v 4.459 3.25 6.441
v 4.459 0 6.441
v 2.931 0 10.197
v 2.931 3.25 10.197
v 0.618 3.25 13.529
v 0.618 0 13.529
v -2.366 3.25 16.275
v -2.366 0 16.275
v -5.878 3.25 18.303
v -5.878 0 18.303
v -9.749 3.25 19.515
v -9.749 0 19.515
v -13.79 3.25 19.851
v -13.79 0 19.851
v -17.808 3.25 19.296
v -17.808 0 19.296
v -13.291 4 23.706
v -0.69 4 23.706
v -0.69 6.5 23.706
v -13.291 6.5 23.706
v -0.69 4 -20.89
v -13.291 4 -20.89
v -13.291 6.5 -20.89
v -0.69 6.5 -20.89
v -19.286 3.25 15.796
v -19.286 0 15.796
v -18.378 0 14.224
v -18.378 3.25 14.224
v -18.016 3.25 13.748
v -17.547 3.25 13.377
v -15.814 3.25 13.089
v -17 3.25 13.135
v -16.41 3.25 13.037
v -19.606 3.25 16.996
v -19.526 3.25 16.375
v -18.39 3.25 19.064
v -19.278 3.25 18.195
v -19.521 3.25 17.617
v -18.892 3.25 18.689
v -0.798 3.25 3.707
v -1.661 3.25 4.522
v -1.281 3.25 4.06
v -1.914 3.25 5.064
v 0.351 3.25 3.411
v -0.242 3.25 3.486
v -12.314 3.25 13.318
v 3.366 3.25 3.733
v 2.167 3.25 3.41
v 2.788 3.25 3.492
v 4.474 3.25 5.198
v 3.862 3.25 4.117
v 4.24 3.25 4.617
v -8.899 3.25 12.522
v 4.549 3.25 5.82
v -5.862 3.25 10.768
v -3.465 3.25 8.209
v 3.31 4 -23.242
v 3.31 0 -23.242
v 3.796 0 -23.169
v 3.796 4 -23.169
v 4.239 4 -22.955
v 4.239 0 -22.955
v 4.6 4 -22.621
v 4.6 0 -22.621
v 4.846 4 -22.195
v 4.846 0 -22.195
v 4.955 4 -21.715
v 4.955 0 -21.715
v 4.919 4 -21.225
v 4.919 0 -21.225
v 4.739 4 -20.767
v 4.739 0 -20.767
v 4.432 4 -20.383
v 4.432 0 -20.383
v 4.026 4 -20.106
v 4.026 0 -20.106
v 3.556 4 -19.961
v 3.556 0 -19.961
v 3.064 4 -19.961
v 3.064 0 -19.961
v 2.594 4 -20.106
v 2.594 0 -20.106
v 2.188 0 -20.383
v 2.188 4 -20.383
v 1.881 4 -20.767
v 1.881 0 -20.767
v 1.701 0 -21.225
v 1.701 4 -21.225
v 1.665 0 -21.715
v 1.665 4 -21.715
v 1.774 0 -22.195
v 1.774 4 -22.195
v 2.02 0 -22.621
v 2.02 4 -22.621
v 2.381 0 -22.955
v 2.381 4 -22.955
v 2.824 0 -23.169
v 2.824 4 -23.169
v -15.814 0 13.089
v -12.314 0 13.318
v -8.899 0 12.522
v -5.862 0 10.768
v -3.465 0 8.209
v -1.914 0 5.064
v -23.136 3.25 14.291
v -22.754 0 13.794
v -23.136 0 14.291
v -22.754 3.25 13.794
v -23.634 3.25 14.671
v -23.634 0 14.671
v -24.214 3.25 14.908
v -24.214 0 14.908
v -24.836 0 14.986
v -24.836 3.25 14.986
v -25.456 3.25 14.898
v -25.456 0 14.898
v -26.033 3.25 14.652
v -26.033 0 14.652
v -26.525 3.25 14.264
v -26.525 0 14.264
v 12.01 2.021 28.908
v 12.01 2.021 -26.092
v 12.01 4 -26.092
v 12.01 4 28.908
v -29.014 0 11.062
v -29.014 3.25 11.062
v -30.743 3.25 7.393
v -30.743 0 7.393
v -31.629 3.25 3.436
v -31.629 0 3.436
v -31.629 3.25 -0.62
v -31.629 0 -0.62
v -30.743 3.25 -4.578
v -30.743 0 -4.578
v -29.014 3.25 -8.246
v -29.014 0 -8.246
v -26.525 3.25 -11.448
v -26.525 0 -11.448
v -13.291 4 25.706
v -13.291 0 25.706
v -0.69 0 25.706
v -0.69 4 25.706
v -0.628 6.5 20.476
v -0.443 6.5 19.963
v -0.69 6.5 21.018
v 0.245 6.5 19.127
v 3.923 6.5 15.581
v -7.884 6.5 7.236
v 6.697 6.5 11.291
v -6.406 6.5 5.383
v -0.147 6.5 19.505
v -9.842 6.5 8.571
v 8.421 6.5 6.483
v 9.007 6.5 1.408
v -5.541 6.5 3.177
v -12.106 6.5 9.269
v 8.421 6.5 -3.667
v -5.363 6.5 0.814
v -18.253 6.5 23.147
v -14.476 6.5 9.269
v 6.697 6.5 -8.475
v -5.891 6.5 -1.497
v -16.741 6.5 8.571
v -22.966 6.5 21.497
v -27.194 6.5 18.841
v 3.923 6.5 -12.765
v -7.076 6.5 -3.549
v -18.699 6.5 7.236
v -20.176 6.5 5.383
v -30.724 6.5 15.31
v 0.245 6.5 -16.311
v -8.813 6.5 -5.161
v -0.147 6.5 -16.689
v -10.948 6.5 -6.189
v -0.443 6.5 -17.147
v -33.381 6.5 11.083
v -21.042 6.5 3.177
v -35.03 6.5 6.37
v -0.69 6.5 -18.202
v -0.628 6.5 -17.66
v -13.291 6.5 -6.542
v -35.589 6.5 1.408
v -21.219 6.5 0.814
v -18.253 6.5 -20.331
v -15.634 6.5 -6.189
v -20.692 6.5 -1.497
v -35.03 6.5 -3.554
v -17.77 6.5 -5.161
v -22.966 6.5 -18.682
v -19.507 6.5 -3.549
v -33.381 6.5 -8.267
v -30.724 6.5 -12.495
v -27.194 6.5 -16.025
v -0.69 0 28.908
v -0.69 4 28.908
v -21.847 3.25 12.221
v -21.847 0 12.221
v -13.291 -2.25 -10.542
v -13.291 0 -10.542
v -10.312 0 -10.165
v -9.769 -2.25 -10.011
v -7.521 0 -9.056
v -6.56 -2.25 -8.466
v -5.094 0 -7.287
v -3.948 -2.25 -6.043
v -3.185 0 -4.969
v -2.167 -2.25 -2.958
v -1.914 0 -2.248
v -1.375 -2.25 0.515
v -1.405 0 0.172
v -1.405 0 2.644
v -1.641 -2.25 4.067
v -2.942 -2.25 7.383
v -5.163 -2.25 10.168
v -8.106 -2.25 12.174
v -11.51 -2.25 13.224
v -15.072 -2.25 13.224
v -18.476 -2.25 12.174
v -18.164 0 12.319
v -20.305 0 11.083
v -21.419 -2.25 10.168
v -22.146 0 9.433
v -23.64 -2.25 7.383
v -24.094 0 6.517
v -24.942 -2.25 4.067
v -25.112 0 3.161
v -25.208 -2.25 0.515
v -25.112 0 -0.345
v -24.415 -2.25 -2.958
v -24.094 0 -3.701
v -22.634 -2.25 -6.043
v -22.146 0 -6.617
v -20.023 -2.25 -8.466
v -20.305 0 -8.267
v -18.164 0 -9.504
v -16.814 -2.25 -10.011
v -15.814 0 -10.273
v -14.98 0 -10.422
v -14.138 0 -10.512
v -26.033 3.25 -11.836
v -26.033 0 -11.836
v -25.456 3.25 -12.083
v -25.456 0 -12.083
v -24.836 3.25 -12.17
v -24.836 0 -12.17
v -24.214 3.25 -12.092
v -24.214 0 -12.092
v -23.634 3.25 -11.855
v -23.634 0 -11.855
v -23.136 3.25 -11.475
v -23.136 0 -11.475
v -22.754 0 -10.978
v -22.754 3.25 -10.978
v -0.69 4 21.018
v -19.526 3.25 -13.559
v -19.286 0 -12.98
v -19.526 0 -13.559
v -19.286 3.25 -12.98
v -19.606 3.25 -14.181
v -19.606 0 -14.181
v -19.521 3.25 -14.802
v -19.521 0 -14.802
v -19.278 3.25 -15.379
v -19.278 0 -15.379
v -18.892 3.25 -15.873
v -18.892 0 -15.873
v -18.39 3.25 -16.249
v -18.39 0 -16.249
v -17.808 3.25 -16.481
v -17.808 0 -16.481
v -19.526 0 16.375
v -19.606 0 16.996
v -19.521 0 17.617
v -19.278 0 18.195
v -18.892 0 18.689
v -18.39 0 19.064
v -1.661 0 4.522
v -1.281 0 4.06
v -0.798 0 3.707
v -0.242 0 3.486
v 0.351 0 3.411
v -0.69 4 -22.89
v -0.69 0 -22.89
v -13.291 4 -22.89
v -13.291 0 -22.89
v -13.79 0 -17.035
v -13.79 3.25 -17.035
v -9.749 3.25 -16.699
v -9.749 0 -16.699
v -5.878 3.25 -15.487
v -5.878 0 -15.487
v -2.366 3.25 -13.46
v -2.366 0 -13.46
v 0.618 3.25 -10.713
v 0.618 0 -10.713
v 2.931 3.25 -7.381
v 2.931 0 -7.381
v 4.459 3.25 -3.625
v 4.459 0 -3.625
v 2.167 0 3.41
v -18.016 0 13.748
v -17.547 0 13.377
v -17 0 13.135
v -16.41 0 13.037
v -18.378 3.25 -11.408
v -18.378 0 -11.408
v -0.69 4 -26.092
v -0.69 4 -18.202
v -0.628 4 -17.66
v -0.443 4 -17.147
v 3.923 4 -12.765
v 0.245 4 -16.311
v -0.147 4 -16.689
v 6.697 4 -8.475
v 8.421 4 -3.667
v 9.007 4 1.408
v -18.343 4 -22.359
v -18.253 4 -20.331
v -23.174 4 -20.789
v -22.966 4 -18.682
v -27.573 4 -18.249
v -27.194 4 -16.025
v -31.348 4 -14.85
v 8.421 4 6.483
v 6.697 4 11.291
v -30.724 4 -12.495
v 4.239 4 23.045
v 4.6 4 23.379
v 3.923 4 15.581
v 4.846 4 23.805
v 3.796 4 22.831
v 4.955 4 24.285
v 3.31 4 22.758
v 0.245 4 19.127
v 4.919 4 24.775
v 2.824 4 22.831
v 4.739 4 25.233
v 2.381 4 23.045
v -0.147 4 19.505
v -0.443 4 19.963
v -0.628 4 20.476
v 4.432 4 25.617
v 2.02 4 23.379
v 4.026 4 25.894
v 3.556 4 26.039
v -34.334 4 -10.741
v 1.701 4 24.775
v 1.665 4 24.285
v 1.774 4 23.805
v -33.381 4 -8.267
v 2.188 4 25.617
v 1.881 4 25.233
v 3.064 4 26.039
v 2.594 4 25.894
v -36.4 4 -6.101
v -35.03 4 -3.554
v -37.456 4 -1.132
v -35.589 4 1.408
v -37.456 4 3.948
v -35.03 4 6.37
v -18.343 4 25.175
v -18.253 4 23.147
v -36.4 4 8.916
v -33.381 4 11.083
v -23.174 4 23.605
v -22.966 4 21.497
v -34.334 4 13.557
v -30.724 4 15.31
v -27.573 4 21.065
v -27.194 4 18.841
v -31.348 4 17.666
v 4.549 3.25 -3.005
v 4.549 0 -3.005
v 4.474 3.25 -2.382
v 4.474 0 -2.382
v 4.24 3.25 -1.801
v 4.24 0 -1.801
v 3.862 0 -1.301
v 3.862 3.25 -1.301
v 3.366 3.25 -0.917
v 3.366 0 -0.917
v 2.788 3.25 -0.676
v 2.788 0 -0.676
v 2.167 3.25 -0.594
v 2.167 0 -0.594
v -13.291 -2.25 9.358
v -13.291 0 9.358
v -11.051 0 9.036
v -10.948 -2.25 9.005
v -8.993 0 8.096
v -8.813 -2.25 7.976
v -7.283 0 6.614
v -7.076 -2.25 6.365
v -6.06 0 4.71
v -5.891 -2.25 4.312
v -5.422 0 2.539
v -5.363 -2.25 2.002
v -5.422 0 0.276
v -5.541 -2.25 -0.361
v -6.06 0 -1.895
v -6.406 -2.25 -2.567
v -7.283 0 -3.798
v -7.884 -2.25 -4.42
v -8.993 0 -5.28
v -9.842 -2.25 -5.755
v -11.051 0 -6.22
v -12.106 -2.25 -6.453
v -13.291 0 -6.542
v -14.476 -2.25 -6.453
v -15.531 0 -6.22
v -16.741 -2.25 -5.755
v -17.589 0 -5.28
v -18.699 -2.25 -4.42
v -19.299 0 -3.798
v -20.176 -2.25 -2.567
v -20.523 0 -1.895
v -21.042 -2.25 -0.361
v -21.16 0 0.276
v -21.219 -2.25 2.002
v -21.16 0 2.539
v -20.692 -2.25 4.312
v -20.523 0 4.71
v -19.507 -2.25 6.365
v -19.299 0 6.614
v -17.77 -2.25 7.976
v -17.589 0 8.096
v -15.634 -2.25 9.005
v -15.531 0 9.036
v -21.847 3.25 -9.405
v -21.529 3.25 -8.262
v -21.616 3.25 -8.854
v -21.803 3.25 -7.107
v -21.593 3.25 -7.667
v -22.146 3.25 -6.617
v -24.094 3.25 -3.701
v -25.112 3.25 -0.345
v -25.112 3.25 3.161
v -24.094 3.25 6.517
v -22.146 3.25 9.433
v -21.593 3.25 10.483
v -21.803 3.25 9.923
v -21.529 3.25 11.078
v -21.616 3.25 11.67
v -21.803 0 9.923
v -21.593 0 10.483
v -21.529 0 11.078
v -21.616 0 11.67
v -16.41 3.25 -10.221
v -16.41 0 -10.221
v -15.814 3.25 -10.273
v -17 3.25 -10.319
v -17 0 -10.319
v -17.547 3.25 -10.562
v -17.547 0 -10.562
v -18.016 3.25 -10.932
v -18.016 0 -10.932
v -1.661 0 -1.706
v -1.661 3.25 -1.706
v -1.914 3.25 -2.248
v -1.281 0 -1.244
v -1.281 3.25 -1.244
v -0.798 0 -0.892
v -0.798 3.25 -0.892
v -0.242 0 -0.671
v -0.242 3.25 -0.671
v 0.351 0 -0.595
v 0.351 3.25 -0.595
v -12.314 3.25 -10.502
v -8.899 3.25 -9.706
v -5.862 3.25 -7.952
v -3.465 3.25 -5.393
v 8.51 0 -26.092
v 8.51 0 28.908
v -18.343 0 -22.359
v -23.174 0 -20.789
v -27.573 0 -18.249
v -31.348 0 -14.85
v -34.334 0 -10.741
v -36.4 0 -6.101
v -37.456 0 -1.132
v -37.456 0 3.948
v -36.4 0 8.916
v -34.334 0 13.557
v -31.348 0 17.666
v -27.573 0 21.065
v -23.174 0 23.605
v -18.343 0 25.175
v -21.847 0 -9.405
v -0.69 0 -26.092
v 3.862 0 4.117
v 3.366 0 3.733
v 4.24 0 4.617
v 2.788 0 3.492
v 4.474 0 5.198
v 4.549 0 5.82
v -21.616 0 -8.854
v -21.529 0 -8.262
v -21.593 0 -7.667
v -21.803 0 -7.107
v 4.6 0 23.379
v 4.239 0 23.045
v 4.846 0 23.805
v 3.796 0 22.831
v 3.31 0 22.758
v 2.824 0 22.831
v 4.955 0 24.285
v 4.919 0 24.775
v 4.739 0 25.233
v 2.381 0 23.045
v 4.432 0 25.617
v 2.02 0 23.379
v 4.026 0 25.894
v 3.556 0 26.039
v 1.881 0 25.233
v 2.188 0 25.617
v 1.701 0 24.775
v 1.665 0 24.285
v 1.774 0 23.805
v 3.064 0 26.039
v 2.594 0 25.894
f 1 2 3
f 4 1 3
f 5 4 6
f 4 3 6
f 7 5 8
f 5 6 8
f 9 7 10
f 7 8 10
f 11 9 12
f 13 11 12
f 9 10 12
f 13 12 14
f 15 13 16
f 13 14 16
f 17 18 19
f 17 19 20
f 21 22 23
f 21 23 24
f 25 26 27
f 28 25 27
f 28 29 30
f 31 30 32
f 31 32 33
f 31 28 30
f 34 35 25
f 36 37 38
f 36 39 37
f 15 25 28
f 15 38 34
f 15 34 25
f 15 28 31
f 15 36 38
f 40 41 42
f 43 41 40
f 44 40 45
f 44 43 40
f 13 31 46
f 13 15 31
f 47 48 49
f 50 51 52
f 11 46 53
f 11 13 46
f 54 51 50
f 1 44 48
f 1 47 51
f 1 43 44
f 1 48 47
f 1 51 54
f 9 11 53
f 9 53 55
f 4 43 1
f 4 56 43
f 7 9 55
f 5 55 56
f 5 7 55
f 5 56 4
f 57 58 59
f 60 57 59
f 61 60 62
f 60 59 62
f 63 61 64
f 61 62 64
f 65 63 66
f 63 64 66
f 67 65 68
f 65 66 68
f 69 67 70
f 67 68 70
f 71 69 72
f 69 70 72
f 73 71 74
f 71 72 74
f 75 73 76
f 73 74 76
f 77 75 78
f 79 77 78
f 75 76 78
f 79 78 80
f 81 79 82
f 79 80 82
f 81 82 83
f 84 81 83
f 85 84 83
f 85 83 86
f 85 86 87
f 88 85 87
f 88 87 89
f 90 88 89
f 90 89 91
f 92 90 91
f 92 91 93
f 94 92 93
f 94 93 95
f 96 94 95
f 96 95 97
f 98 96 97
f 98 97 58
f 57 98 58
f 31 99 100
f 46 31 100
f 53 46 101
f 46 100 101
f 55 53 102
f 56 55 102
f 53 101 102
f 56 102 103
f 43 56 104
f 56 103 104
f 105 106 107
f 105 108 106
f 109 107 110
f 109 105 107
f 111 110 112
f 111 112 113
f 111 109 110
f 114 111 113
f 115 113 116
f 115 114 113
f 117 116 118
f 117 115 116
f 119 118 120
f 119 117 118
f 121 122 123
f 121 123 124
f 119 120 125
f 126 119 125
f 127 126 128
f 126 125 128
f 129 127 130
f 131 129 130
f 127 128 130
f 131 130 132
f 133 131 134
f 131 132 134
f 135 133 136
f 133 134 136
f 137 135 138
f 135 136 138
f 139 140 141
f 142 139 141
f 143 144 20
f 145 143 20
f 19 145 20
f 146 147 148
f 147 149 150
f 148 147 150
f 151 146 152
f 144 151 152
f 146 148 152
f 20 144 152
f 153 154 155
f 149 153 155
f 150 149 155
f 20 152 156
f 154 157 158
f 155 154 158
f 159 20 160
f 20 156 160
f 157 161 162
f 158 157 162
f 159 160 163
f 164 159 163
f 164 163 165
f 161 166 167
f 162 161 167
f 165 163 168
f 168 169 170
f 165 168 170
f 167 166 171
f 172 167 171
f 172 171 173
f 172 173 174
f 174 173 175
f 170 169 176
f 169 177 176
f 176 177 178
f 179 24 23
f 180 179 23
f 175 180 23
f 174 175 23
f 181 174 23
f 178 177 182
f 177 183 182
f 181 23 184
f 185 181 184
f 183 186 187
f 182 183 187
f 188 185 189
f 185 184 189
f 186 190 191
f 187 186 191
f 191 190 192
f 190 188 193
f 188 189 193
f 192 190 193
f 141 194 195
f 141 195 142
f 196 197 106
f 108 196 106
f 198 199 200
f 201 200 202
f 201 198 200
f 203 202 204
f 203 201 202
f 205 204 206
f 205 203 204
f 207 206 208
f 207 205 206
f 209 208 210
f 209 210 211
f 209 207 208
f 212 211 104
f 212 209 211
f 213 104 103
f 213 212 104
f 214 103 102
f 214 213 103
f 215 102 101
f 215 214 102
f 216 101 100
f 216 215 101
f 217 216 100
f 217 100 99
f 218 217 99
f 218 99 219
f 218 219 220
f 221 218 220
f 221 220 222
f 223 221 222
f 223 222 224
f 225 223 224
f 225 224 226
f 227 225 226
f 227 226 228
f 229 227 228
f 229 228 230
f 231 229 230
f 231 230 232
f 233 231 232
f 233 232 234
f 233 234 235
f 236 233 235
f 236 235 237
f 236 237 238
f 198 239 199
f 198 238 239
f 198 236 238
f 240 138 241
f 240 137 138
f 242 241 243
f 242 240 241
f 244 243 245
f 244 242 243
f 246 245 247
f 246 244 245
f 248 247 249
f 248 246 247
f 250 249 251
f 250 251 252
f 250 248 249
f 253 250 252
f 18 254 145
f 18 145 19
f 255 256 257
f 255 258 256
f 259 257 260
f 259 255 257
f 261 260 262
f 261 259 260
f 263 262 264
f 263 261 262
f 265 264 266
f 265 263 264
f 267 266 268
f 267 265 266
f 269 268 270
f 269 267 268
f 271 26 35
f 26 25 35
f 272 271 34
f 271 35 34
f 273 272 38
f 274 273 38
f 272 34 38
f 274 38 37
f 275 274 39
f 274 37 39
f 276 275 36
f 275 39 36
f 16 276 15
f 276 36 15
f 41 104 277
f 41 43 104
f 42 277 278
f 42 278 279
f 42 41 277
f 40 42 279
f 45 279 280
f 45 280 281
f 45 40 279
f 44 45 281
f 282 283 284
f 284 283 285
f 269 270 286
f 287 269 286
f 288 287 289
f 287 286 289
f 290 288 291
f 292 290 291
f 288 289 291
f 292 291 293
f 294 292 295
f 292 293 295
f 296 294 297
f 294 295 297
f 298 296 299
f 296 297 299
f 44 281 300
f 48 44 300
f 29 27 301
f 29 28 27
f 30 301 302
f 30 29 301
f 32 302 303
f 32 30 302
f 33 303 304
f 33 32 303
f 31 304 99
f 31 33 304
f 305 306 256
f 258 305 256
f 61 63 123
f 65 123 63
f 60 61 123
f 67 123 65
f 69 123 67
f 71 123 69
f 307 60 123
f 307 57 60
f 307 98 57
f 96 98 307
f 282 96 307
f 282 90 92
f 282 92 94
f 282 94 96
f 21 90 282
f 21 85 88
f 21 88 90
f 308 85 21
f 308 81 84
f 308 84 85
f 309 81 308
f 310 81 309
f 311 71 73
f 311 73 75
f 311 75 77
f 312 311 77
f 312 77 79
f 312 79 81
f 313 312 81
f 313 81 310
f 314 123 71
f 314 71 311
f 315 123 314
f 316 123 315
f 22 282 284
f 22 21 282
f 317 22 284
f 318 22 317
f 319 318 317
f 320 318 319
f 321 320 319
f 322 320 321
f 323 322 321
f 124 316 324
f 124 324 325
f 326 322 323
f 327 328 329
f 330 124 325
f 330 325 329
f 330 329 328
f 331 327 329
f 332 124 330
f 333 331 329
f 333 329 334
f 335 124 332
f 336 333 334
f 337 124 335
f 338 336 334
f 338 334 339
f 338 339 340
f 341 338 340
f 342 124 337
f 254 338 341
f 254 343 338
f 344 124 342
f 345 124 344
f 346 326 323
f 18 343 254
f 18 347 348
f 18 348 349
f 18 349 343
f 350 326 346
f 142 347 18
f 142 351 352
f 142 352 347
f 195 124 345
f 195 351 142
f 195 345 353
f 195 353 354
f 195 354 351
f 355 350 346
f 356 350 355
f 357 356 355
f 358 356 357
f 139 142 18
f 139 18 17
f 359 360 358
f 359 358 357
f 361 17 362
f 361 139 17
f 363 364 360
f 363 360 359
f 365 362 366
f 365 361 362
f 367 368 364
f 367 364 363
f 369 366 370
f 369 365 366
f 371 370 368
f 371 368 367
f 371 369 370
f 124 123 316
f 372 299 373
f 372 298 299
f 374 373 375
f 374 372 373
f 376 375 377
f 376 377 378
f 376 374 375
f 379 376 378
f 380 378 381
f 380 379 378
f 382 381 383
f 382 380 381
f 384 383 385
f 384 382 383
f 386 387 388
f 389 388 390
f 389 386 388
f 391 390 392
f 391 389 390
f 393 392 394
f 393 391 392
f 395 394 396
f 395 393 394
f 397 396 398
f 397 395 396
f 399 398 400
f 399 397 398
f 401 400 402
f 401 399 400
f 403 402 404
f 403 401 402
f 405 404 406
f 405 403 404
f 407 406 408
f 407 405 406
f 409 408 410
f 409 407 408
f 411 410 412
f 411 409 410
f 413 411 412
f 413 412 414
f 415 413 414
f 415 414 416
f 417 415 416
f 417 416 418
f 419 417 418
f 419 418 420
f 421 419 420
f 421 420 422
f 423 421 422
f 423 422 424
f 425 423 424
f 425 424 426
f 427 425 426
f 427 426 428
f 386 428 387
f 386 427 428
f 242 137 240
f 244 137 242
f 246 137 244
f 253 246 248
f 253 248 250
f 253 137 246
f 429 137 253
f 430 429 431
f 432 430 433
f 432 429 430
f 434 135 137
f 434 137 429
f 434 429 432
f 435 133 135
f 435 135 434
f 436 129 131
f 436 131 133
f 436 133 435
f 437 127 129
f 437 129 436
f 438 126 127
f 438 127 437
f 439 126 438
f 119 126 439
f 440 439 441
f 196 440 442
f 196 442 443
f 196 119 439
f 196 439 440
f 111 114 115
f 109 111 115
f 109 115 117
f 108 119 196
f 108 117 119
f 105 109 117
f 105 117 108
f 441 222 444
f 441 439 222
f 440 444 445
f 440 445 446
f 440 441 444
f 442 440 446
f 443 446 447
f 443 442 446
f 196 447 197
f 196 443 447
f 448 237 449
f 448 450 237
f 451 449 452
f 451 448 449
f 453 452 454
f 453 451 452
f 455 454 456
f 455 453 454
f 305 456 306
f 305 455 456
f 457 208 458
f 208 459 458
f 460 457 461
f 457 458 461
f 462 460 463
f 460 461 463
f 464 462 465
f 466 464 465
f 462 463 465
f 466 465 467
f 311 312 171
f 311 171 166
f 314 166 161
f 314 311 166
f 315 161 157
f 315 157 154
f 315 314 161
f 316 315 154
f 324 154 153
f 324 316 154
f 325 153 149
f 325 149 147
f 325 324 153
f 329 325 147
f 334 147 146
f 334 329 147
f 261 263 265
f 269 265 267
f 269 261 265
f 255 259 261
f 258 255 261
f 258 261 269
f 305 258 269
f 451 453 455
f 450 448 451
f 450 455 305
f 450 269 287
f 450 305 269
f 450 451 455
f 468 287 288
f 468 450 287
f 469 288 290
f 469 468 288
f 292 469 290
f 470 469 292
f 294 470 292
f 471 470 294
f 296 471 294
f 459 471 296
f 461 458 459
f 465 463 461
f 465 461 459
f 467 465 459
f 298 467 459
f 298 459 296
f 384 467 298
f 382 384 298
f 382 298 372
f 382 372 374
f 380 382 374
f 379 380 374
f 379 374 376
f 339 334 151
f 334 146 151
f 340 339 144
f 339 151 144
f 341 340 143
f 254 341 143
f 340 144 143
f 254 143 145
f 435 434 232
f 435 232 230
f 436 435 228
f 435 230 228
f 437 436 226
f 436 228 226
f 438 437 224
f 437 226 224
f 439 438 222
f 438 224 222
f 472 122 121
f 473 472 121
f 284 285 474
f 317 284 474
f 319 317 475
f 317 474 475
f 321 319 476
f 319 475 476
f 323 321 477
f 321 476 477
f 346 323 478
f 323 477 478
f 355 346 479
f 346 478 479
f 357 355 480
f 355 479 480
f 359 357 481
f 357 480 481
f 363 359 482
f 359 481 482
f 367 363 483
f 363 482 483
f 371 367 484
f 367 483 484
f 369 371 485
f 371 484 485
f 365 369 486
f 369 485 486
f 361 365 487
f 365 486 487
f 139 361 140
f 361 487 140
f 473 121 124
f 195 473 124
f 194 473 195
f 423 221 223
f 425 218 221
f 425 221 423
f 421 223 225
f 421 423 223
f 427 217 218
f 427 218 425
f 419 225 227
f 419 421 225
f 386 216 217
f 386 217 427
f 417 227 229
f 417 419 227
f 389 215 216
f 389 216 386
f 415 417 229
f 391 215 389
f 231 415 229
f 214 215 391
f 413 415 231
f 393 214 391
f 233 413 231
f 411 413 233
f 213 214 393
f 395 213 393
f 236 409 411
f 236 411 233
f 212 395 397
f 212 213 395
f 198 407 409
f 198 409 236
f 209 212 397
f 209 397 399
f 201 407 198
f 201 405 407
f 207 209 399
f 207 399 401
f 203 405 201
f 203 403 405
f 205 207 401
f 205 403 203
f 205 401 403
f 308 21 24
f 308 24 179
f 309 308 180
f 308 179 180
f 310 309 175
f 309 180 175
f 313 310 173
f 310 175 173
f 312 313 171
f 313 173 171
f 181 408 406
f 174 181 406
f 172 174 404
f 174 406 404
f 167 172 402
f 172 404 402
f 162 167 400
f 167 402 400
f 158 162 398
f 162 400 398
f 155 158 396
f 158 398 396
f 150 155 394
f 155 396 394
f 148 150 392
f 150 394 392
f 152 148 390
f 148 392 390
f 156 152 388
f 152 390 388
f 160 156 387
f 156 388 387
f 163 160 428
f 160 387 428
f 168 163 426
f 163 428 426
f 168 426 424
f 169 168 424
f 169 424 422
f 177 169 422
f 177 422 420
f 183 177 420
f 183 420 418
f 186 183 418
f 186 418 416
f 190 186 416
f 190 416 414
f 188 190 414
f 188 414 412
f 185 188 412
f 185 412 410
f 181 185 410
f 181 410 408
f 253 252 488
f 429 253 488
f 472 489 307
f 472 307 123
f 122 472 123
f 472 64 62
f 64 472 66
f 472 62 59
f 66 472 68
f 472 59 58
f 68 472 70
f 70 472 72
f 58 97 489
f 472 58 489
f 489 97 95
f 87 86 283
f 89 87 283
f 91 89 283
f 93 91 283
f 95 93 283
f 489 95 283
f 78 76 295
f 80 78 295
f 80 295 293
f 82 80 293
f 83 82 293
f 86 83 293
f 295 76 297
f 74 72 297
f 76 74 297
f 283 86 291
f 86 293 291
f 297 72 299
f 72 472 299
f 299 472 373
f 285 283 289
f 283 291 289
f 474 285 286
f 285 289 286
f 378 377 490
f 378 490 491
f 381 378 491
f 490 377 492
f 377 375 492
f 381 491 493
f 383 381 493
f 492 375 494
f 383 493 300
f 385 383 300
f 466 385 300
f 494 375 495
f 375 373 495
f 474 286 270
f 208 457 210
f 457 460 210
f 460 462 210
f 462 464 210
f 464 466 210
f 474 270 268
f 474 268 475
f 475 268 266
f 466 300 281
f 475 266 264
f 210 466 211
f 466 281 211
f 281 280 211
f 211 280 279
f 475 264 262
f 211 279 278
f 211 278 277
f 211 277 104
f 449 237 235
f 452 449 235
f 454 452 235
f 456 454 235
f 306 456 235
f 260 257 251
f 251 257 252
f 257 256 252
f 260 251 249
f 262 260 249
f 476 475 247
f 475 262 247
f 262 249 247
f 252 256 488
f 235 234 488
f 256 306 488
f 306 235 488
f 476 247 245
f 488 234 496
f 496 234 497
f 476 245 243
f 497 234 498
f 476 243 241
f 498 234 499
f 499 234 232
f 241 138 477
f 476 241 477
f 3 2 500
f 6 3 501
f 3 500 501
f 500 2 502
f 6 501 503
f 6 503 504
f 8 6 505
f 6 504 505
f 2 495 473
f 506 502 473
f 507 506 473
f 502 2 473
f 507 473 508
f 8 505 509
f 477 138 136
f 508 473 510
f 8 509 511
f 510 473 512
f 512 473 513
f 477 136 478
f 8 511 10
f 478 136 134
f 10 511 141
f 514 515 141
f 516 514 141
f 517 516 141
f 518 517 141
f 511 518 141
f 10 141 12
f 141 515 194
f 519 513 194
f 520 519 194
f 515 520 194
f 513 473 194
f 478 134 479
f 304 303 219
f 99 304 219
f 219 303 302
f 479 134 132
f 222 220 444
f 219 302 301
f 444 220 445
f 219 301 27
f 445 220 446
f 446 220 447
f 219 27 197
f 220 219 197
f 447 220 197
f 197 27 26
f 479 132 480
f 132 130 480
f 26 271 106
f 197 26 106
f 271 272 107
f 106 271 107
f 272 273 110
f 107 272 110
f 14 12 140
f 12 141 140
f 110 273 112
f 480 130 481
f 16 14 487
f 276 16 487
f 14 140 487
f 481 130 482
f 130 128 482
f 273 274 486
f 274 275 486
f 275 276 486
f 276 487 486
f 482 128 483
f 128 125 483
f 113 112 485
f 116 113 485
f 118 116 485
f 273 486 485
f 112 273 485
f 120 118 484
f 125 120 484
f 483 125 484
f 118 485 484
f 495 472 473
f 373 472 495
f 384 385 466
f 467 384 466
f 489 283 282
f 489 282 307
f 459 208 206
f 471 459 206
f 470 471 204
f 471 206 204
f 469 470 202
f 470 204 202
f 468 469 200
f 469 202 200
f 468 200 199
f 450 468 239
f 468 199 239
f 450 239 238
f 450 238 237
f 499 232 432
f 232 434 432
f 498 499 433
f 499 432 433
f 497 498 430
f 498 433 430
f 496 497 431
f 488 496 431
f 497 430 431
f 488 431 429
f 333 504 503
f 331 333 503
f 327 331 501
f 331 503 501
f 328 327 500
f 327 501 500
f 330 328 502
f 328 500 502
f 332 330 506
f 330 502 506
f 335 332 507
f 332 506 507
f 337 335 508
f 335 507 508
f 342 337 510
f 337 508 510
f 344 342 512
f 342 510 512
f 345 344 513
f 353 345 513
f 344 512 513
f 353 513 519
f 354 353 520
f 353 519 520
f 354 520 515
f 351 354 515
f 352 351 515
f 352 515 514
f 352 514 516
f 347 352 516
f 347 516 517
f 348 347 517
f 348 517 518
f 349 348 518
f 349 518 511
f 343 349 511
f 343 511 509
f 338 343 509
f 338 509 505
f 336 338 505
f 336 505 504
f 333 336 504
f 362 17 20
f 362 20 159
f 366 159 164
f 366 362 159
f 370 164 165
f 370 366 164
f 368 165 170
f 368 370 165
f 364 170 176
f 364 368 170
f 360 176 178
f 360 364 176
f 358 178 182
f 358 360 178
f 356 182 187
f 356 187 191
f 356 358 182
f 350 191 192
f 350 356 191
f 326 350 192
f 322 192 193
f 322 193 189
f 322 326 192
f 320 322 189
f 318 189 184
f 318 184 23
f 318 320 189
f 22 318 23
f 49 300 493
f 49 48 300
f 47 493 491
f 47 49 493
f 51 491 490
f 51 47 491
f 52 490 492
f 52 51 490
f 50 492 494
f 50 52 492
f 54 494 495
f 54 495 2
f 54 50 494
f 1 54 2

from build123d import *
from build123d.topology import SkipClean

# Parameters (mm, degrees)
BOSS_EXTRUDE1_DEPTH = 4
BOSS_EXTRUDE2_DEPTH = 2.5
SKETCH3_R           = 7.95
CUT_EXTRUDE1_DEPTH  = 9.25
SKETCH4_R           = 1.65
CUT_EXTRUDE2_DEPTH  = 9.25
CUT_EXTRUDE3_DEPTH  = 3.25
FILLET1_R           = 2.38125
CHAMFER1_SIZE       = 3.5
CHAMFER1_SIZE2      = 2.020725942
BOSS_EXTRUDE4_DEPTH = 4
BOSS_EXTRUDE5_START = 2.25
SKETCH11_R          = 11.95
BOSS_EXTRUDE5_DEPTH = 2.25
CUT_EXTRUDE4_START  = -2.25
SKETCH12_R          = 7.95
CUT_EXTRUDE4_DEPTH  = 2.25
FILLET5_R           = 2.38


with BuildPart() as part:
    # Sketch1 → Boss-Extrude1 (new body)
    with BuildSketch(Plane(origin=(0, 0, 0), x_dir=(1, 0, 0), z_dir=(0, 1, 0))):
        with BuildLine():
            Line((-13.29118379, 20.889836125), (-0.68999579, 20.889836125))
            Line((-0.68999579, 20.889836125), (-0.68999579, 26.09210312))
            Line((-0.68999579, 26.09210312), (12.01000421, 26.09210312))
            Line((12.01000421, 26.09210312), (12.01000421, -28.90789688))
            Line((12.01000421, -28.90789688), (-0.68999579, -28.90789688))
            Line((-0.68999579, -28.90789688), (-0.68999579, -23.705629885))
            Line((-0.68999579, -23.705629885), (-13.29118379, -23.705629885))
            ThreePointArc((-13.29118379, -23.705629885), (-35.588916795, -1.40789688), (-13.29118379, 20.889836125))
        make_face()
    extrude(amount=BOSS_EXTRUDE1_DEPTH)

    # Sketch2 → Boss-Extrude2 (add)
    with BuildSketch(Plane(origin=(0, 4, 0), x_dir=(1, 0, 0), z_dir=(0, 1, 0))):
        with BuildLine():
            Line((-13.29118379, 20.889836125), (-0.68999579, 20.889836125))
            Line((-0.68999579, 20.889836125), (-0.68999579, 16.987726462))
            ThreePointArc((-0.68999579, 16.987726462), (9.006549215, -1.40789688), (-0.68999579, -19.803520222))
            Line((-0.68999579, -19.803520222), (-0.68999579, -23.705629885))
            Line((-0.68999579, -23.705629885), (-13.29118379, -23.705629885))
            ThreePointArc((-13.29118379, -23.705629885), (-35.588916795, -1.40789688), (-13.29118379, 20.889836125))
        make_face()
    extrude(amount=BOSS_EXTRUDE2_DEPTH)

    # Sketch3 → Cut-Extrude1 (cut)
    with BuildSketch(Plane.XZ):
        with Locations(Location((-13.29118379, 1.40789688, 0), (0, 0, 270))):
            Circle(SKETCH3_R)
    extrude(amount=-CUT_EXTRUDE1_DEPTH, mode=Mode.SUBTRACT)

    # Sketch4 → Cut-Extrude2 (cut)
    with BuildSketch(Plane.XZ):
        with Locations(Location((3.31000421, 24.40789688, 0), (0, 0, 270))):
            Circle(SKETCH4_R)
        with Locations(Location((3.310004206, -21.59210312, 0), (0, 0, 270))):
            Circle(SKETCH4_R)
    extrude(amount=-CUT_EXTRUDE2_DEPTH, mode=Mode.SUBTRACT)

    # Sketch5 → Cut-Extrude3 (cut)
    with BuildSketch(Plane.XZ):
        with BuildLine():
            ThreePointArc((-20.917233099, -7.792422241), (-25.24118379, 1.40789688), (-20.917233099, 10.608216001))
            Line((-20.917233099, 10.608216001), (-24.193916765, 16.291878661))
            ThreePointArc((-24.193916765, 16.291878661), (-31.74118379, 1.40789688), (-24.193916765, -13.476084902))
            Line((-24.193916765, -13.476084902), (-20.917233099, -7.792422241))
        make_face()
        with BuildLine():
            Line((-20.729723635, 18.291931497), (-17.445869217, 12.612408873))
            ThreePointArc((-17.445869217, 12.612408873), (-7.31618379, 11.756900455), (-1.510449053, 3.412089752))
            Line((-1.510449053, 3.412089752), (5.05008903, 3.407949716))
            ThreePointArc((5.05008903, 3.407949716), (-4.06618379, 17.38606558), (-20.729723635, 18.291931497))
        make_face()
        with BuildLine():
            ThreePointArc((-1.510449053, -0.596295992), (-7.31618379, -8.941106696), (-17.445869217, -9.796615113))
            Line((-17.445869217, -9.796615113), (-20.729723635, -15.476137738))
            ThreePointArc((-20.729723635, -15.476137738), (-4.06618379, -14.57027182), (5.05008903, -0.592155956))
            Line((5.05008903, -0.592155956), (-1.510449053, -0.596295992))
        make_face()
    extrude(amount=-CUT_EXTRUDE3_DEPTH, mode=Mode.SUBTRACT)

    # Fillet1
    fillet1_edges = [part.edges().sort_by_distance(p)[0] for p in [
        (-20.917233099, 1.625, 10.608216001),
        (-20.917233099, 1.625, -7.792422241),
        (-24.193916765, 1.625, -13.476084902),
        (-24.193916765, 1.625, 16.291878661),
        (5.05008903, 1.625, 3.407949716),
        (-1.510449053, 1.625, 3.412089752),
        (-17.445869217, 1.625, 12.612408873),
        (-20.729723635, 1.625, 18.291931497),
        (-17.445869217, 1.625, -9.796615113),
        (-1.510449053, 1.625, -0.596295992),
        (5.05008903, 1.625, -0.592155956),
        (-20.729723635, 1.625, -15.476137738),
    ]]
    fillet(fillet1_edges, radius=FILLET1_R)

    # Chamfer1
    chamfer1_edges = [part.edges().sort_by_distance(p)[0] for p in [
        (12.01000421, 0, 1.40789688),
    ]]
    chamfer1_side = [part.faces().sort_by_distance(p)[0] for p in [
        (-3.702499267, 0, 18.015985651),
    ]]
    chamfer(chamfer1_edges, length=CHAMFER1_SIZE, length2=CHAMFER1_SIZE2, reference=chamfer1_side[0])

    # Sketch10 → Boss-Extrude4 (add)
    with BuildSketch(Plane.XZ):
        with BuildLine():
            Line((-0.68999579, -22.889836125), (-13.29118379, -22.889836125))
            ThreePointArc((-13.29118379, -22.889836125), (-37.588916795, 1.40789688), (-13.29118379, 25.705629885))
            Line((-13.29118379, 25.705629885), (-0.68999579, 25.705629885))
            Line((-0.68999579, 25.705629885), (-0.68999579, 23.705629885))
            Line((-0.68999579, 23.705629885), (-13.29118379, 23.705629885))
            ThreePointArc((-13.29118379, 23.705629885), (-35.588916795, 1.40789688), (-13.29118379, -20.889836125))
            Line((-13.29118379, -20.889836125), (-0.68999579, -20.889836125))
            Line((-0.68999579, -20.889836125), (-0.68999579, -22.889836125))
        make_face()
    extrude(amount=-BOSS_EXTRUDE4_DEPTH)

    # Sketch11 → Boss-Extrude5 (add)
    with SkipClean():  # the faces are left unmerged after this step: merging them gives an invalid solid
        with BuildSketch(Plane.XZ.offset(BOSS_EXTRUDE5_START)):
            with Locations(Location((-13.29118379, 1.40789688, 0), (0, 0, 270))):
                Circle(SKETCH11_R)
        extrude(amount=-BOSS_EXTRUDE5_DEPTH)

    # Sketch12 → Cut-Extrude4 (cut)
    with SkipClean():  # the faces are left unmerged after this step: merging them gives an invalid solid
        with BuildSketch(Plane(origin=(0, 0, 0), x_dir=(1, 0, 0), z_dir=(0, 1, 0)).offset(CUT_EXTRUDE4_START)):
            with Locations(Location((-13.29118379, -1.40789688, 0), (0, 0, 270))):
                Circle(SKETCH12_R)
        extrude(amount=CUT_EXTRUDE4_DEPTH, mode=Mode.SUBTRACT)

    # Fillet5
    fillet5_edges = [part.edges().sort_by_distance(p)[0] for p in [
        (-0.68999579, 5.25, 19.803520222),
        (-0.68999579, 5.25, -16.987726462),
    ]]
    fillet(fillet5_edges, radius=FILLET5_R)


solid = part.part
